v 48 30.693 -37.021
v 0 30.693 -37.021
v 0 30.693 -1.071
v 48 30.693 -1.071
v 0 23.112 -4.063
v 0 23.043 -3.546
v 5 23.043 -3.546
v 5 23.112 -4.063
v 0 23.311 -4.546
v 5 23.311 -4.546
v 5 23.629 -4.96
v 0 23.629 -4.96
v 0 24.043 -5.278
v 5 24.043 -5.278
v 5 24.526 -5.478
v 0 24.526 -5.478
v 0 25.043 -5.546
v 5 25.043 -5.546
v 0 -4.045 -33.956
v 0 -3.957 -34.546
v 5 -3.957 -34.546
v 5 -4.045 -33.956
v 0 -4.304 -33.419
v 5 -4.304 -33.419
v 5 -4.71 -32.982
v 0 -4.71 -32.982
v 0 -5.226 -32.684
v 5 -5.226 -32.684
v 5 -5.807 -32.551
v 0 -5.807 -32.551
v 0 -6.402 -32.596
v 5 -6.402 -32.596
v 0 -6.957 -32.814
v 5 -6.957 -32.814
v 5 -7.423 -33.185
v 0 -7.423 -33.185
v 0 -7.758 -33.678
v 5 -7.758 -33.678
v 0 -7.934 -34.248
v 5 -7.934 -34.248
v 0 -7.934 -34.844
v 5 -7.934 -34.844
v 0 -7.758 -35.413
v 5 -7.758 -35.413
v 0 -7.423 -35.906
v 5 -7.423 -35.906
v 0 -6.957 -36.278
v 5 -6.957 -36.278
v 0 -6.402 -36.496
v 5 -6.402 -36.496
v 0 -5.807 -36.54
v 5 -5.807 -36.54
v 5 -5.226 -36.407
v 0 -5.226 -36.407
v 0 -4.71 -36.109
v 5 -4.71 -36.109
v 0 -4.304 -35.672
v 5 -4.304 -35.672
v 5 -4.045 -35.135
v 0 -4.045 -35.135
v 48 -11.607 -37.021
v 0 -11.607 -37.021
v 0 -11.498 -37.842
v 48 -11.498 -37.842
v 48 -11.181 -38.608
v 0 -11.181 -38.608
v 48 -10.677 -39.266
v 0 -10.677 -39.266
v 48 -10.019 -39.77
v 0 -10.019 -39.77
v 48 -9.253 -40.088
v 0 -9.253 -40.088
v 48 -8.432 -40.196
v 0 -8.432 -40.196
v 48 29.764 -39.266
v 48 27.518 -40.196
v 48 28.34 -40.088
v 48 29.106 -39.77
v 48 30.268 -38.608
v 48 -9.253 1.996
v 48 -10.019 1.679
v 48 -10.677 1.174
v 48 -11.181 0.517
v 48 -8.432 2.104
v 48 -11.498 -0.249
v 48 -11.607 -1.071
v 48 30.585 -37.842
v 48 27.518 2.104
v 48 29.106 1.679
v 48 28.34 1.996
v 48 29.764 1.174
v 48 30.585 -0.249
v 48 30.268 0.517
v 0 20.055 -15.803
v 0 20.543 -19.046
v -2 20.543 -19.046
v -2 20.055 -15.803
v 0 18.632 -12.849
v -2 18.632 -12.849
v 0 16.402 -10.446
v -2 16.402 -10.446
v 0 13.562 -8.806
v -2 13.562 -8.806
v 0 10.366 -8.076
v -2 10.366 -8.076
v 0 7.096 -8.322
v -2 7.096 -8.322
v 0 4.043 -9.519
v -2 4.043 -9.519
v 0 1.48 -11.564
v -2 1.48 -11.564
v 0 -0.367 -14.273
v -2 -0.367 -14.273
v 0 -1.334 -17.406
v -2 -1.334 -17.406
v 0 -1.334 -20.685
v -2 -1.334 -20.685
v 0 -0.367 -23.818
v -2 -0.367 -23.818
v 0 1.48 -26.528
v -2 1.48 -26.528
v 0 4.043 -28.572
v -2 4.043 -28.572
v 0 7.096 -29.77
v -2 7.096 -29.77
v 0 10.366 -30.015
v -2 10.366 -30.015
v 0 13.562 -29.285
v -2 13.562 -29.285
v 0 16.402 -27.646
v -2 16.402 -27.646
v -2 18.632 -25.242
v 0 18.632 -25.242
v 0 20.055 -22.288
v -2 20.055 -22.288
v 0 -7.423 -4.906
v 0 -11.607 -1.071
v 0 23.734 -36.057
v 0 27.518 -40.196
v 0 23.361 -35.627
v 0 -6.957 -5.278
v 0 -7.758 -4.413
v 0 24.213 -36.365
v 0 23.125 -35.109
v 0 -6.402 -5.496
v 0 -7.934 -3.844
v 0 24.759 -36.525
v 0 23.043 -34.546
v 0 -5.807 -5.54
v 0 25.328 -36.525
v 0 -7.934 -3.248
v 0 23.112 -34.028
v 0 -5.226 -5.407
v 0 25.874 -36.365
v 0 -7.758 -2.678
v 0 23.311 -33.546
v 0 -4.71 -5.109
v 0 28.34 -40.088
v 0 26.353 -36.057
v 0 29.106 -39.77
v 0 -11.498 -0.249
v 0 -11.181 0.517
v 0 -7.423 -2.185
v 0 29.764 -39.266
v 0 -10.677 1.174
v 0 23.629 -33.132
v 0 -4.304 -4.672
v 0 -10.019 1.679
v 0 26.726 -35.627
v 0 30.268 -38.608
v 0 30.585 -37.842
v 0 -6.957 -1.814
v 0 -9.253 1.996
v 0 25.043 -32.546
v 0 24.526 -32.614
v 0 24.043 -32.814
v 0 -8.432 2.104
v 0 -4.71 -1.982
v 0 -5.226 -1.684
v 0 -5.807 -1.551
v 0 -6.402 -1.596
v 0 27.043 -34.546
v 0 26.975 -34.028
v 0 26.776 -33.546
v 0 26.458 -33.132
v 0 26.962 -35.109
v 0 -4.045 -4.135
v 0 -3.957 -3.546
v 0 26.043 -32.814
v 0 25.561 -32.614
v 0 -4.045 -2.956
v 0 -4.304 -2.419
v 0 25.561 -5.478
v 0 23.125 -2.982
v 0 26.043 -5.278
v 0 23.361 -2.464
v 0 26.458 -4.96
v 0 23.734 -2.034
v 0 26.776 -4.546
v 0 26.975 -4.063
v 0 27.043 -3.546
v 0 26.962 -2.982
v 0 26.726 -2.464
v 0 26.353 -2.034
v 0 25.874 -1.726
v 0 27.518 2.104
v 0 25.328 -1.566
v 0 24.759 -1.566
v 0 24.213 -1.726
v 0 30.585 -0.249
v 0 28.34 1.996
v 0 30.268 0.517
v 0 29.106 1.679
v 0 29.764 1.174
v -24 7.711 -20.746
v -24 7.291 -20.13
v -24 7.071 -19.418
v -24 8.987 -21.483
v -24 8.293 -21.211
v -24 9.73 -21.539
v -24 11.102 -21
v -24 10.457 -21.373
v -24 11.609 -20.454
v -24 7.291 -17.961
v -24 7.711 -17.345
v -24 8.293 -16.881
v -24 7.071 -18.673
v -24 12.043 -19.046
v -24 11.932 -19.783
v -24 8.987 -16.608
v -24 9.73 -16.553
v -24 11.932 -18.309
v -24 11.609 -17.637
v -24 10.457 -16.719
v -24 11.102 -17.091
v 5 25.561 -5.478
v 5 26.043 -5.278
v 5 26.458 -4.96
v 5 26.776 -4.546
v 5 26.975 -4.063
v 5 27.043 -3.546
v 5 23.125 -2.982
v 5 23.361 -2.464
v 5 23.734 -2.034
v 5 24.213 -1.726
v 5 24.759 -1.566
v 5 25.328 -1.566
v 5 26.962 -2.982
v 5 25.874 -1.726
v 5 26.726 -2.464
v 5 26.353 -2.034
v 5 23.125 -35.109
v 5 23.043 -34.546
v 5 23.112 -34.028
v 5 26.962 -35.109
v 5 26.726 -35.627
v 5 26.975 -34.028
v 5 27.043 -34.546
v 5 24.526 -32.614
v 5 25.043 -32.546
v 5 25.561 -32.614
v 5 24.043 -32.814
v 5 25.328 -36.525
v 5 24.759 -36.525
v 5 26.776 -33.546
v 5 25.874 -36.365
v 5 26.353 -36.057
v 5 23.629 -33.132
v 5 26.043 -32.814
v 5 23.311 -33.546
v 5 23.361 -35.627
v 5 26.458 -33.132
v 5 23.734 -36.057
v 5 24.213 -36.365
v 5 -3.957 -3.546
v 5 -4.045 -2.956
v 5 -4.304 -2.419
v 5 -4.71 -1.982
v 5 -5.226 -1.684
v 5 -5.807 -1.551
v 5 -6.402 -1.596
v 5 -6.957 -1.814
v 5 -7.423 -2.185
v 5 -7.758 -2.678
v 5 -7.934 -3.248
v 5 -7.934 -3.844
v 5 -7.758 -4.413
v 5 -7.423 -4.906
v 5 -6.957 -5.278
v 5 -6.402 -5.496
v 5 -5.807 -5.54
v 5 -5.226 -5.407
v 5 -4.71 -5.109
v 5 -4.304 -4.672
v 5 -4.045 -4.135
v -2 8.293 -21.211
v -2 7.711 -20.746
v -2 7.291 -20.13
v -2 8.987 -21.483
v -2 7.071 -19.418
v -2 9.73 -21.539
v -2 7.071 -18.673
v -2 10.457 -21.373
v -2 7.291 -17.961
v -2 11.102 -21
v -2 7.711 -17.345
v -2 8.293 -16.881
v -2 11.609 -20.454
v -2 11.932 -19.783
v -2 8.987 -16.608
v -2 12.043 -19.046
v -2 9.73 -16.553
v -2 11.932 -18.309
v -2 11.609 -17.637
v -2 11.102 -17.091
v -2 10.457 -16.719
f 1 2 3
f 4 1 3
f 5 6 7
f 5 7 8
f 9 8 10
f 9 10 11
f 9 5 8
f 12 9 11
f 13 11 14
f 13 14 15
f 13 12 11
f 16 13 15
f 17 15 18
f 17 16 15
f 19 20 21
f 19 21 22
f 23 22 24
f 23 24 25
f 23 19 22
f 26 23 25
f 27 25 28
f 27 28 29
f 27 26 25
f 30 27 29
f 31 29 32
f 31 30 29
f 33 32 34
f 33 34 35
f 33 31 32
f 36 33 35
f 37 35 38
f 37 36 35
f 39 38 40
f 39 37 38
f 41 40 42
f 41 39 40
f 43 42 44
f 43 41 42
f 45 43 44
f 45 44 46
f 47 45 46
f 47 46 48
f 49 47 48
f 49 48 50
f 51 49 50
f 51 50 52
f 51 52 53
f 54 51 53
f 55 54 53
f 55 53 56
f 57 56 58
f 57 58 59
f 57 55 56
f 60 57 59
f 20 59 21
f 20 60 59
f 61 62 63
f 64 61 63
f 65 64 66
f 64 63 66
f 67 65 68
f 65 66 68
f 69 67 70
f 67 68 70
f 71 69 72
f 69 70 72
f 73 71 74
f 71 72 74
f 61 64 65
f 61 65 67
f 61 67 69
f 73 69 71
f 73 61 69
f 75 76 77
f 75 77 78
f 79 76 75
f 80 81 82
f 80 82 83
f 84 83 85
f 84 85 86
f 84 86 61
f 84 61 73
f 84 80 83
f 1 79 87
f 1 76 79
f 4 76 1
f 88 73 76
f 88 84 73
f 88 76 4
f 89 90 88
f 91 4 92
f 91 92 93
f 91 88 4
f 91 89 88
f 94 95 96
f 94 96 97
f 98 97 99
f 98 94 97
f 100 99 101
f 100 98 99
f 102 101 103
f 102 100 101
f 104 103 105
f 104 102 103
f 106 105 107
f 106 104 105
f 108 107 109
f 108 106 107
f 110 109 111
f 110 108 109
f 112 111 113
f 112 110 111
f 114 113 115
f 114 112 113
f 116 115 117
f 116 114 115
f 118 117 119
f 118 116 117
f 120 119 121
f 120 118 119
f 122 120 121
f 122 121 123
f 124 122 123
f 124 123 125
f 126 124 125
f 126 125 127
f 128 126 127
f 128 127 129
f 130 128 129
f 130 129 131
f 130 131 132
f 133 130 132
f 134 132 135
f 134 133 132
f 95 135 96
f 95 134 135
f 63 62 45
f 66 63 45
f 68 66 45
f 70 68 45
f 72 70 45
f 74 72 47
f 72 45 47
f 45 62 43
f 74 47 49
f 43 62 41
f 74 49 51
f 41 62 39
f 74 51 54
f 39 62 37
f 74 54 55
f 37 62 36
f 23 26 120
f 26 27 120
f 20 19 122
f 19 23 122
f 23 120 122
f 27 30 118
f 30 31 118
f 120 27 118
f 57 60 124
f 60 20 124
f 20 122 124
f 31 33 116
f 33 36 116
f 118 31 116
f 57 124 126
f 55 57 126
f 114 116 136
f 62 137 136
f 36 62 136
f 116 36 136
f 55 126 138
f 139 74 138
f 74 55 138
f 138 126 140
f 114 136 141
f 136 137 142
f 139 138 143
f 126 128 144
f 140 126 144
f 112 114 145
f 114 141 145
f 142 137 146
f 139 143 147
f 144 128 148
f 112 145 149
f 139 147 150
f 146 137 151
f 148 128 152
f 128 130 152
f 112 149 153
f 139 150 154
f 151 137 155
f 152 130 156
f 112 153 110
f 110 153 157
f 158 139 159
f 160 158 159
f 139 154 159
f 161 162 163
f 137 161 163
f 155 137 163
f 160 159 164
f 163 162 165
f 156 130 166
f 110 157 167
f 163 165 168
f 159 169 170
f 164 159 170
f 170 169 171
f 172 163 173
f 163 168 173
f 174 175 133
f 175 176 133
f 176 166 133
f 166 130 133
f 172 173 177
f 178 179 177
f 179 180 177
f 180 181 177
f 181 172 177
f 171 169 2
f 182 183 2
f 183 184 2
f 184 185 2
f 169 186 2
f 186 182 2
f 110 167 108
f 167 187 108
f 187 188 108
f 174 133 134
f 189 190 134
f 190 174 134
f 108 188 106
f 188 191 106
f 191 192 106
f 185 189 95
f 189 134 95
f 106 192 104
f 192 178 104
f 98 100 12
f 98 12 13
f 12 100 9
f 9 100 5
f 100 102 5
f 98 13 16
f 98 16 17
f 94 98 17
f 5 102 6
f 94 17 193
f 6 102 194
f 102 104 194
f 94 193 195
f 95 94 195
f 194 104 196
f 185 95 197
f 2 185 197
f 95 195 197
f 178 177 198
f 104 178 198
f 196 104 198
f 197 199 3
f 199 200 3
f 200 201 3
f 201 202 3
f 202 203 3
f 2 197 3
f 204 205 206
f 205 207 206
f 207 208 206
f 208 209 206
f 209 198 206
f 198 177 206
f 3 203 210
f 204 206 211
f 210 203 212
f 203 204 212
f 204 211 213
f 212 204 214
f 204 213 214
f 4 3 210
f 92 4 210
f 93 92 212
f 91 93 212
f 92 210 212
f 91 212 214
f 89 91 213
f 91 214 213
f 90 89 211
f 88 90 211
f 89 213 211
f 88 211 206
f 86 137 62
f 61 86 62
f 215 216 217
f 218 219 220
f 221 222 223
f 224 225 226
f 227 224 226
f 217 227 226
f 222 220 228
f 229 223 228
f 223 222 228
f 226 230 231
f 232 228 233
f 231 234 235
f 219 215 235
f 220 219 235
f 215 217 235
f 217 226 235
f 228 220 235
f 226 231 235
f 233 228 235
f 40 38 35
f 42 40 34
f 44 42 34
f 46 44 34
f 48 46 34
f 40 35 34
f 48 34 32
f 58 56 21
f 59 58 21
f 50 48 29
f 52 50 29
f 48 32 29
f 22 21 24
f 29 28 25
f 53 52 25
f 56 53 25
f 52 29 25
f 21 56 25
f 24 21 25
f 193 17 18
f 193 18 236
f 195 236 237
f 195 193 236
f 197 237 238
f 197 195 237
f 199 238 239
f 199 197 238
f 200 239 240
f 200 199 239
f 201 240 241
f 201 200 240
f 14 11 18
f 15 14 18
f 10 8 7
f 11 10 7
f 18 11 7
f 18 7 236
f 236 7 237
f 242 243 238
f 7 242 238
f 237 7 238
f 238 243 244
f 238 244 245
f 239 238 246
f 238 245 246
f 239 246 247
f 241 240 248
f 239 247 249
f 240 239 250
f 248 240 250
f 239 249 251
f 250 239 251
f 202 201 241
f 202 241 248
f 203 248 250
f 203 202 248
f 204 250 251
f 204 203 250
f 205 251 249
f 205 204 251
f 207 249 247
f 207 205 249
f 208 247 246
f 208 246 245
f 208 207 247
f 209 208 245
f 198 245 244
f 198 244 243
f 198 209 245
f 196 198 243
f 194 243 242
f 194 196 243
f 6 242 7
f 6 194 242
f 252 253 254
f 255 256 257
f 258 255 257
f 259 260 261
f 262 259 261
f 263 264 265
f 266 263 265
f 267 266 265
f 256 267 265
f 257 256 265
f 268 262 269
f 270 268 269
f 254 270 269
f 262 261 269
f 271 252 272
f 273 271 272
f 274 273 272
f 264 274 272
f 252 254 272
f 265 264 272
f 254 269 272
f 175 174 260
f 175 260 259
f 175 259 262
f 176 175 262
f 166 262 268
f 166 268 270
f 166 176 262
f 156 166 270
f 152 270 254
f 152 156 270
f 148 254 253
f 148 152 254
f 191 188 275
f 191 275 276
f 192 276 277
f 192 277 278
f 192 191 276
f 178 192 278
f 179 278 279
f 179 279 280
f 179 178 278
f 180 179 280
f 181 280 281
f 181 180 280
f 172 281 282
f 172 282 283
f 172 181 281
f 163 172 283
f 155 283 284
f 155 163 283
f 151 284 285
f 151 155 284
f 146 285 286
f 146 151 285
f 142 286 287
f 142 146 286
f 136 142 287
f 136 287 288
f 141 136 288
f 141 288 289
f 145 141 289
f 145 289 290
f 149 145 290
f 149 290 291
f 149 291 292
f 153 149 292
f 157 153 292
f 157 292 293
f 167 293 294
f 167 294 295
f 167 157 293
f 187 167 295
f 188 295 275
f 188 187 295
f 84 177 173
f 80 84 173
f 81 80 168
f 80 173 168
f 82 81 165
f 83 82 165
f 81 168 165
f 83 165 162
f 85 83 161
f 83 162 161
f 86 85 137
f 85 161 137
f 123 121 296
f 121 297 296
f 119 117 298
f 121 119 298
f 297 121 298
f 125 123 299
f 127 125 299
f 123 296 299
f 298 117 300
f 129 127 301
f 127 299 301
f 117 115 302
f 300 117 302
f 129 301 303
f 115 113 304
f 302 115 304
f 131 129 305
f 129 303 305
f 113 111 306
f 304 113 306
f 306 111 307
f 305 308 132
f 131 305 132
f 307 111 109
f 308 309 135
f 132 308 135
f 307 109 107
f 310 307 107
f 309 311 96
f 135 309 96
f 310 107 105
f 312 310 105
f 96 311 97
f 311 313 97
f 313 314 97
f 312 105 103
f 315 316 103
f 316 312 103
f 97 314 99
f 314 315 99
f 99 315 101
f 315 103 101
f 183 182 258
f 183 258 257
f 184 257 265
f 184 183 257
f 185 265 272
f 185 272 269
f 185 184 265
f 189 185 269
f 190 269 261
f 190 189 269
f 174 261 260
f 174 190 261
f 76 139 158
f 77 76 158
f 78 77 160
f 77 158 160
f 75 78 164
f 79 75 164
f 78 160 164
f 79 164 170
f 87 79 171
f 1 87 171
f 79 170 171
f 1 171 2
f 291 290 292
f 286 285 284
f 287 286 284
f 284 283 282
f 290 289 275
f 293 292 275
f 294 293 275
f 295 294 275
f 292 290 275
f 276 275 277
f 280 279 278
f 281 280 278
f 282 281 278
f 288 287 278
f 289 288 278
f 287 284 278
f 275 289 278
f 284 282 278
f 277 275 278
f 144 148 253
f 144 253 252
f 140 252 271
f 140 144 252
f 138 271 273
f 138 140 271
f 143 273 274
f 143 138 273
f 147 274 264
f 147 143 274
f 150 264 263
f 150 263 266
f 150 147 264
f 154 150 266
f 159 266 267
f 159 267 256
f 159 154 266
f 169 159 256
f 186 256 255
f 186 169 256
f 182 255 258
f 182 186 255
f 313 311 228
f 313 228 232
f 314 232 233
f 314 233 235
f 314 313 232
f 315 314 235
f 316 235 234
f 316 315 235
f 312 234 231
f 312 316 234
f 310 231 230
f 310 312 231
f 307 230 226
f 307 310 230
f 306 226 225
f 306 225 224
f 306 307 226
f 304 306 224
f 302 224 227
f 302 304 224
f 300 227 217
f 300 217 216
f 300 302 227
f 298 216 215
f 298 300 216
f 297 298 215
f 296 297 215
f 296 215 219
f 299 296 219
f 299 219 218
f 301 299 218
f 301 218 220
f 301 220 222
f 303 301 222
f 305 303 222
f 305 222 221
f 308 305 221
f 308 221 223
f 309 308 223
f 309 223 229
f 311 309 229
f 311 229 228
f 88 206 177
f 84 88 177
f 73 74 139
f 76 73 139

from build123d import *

# Parameters (mm, degrees)
F0_R     = 11
F0_R_2   = 2.5
F1_DEPTH = 48
F2_DEPTH = 2
F3_DEPTH = 24
F4_R     = 2
F5_DEPTH = 5


with BuildPart() as f1:
    # F0 (on Right) → F1 (new body)
    with BuildSketch(Plane.YZ):
        with BuildLine():
            Line((27.518488, 2.104281), (-8.431512, 2.104281))
            ThreePointArc((-8.431512, 2.104281), (-10.676576, 1.174345), (-11.606512, -1.070719))
            Line((-11.606512, -1.070719), (-11.606512, -37.020719))
            ThreePointArc((-11.606512, -37.020719), (-10.676576, -39.265783), (-8.431512, -40.195719))
            Line((-8.431512, -40.195719), (27.518488, -40.195719))
            ThreePointArc((27.518488, -40.195719), (29.763552, -39.265783), (30.693488, -37.020719))
            Line((30.693488, -37.020719), (30.693488, -1.070719))
            ThreePointArc((30.693488, -1.070719), (29.763552, 1.174345), (27.518488, 2.104281))
        make_face()
        with Locations((9.543488, -19.045719)):
            Circle(F0_R, mode=Mode.SUBTRACT)
        with Locations((9.543488, -19.045719)):
            Circle(F0_R)
        with Locations((9.543488, -19.045719)):
            Circle(F0_R_2, mode=Mode.SUBTRACT)
        with Locations((9.543488, -19.045719)):
            Circle(F0_R_2)
    extrude(amount=F1_DEPTH)

    # F0 (on Right) → F2 (join)
    with BuildSketch(Plane.YZ):
        with Locations((9.543488, -19.045719)):
            Circle(F0_R)
        with Locations((9.543488, -19.045719)):
            Circle(F0_R_2, mode=Mode.SUBTRACT)
        with Locations((9.543488, -19.045719)):
            Circle(F0_R_2)
    extrude(amount=-F2_DEPTH)

    # F0 (on Right) → F3 (join)
    with BuildSketch(Plane.YZ):
        with Locations((9.543488, -19.045719)):
            Circle(F0_R_2)
    extrude(amount=-F3_DEPTH)

    # F4 (on face) → F5 (cut)
    with BuildSketch(Plane.YZ):
        with BuildLine():
            ThreePointArc((25.043488, -5.545719), (26.457701, -4.959933), (27.043488, -3.545719))
            ThreePointArc((27.043488, -3.545719), (25.043488, -1.545719), (23.043488, -3.545719))
            Line((23.043488, -3.545719), (25.043488, -3.545719))
            Line((25.043488, -3.545719), (25.043488, -5.545719))
        make_face()
        with BuildLine():
            Line((25.043488, -3.545719), (23.043488, -3.545719))
            ThreePointArc((23.043488, -3.545719), (23.629274, -4.959933), (25.043488, -5.545719))
            Line((25.043488, -5.545719), (25.043488, -3.545719))
        make_face()
        with BuildLine():
            ThreePointArc((27.043488, -34.545719), (26.457701, -33.131506), (25.043488, -32.545719))
            Line((25.043488, -32.545719), (25.043488, -34.545719))
            Line((25.043488, -34.545719), (23.043488, -34.545719))
            ThreePointArc((23.043488, -34.545719), (25.043488, -36.545719), (27.043488, -34.545719))
        make_face()
        with BuildLine():
            Line((25.043488, -34.545719), (25.043488, -32.545719))
            ThreePointArc((25.043488, -32.545719), (23.629274, -33.131506), (23.043488, -34.545719))
            Line((23.043488, -34.545719), (25.043488, -34.545719))
        make_face()
        with Locations((-5.956512, -34.545719)):
            Circle(F4_R)
        with Locations((-5.956512, -3.545719)):
            Circle(F4_R)
    extrude(amount=F5_DEPTH, mode=Mode.SUBTRACT)


solid = f1.part
